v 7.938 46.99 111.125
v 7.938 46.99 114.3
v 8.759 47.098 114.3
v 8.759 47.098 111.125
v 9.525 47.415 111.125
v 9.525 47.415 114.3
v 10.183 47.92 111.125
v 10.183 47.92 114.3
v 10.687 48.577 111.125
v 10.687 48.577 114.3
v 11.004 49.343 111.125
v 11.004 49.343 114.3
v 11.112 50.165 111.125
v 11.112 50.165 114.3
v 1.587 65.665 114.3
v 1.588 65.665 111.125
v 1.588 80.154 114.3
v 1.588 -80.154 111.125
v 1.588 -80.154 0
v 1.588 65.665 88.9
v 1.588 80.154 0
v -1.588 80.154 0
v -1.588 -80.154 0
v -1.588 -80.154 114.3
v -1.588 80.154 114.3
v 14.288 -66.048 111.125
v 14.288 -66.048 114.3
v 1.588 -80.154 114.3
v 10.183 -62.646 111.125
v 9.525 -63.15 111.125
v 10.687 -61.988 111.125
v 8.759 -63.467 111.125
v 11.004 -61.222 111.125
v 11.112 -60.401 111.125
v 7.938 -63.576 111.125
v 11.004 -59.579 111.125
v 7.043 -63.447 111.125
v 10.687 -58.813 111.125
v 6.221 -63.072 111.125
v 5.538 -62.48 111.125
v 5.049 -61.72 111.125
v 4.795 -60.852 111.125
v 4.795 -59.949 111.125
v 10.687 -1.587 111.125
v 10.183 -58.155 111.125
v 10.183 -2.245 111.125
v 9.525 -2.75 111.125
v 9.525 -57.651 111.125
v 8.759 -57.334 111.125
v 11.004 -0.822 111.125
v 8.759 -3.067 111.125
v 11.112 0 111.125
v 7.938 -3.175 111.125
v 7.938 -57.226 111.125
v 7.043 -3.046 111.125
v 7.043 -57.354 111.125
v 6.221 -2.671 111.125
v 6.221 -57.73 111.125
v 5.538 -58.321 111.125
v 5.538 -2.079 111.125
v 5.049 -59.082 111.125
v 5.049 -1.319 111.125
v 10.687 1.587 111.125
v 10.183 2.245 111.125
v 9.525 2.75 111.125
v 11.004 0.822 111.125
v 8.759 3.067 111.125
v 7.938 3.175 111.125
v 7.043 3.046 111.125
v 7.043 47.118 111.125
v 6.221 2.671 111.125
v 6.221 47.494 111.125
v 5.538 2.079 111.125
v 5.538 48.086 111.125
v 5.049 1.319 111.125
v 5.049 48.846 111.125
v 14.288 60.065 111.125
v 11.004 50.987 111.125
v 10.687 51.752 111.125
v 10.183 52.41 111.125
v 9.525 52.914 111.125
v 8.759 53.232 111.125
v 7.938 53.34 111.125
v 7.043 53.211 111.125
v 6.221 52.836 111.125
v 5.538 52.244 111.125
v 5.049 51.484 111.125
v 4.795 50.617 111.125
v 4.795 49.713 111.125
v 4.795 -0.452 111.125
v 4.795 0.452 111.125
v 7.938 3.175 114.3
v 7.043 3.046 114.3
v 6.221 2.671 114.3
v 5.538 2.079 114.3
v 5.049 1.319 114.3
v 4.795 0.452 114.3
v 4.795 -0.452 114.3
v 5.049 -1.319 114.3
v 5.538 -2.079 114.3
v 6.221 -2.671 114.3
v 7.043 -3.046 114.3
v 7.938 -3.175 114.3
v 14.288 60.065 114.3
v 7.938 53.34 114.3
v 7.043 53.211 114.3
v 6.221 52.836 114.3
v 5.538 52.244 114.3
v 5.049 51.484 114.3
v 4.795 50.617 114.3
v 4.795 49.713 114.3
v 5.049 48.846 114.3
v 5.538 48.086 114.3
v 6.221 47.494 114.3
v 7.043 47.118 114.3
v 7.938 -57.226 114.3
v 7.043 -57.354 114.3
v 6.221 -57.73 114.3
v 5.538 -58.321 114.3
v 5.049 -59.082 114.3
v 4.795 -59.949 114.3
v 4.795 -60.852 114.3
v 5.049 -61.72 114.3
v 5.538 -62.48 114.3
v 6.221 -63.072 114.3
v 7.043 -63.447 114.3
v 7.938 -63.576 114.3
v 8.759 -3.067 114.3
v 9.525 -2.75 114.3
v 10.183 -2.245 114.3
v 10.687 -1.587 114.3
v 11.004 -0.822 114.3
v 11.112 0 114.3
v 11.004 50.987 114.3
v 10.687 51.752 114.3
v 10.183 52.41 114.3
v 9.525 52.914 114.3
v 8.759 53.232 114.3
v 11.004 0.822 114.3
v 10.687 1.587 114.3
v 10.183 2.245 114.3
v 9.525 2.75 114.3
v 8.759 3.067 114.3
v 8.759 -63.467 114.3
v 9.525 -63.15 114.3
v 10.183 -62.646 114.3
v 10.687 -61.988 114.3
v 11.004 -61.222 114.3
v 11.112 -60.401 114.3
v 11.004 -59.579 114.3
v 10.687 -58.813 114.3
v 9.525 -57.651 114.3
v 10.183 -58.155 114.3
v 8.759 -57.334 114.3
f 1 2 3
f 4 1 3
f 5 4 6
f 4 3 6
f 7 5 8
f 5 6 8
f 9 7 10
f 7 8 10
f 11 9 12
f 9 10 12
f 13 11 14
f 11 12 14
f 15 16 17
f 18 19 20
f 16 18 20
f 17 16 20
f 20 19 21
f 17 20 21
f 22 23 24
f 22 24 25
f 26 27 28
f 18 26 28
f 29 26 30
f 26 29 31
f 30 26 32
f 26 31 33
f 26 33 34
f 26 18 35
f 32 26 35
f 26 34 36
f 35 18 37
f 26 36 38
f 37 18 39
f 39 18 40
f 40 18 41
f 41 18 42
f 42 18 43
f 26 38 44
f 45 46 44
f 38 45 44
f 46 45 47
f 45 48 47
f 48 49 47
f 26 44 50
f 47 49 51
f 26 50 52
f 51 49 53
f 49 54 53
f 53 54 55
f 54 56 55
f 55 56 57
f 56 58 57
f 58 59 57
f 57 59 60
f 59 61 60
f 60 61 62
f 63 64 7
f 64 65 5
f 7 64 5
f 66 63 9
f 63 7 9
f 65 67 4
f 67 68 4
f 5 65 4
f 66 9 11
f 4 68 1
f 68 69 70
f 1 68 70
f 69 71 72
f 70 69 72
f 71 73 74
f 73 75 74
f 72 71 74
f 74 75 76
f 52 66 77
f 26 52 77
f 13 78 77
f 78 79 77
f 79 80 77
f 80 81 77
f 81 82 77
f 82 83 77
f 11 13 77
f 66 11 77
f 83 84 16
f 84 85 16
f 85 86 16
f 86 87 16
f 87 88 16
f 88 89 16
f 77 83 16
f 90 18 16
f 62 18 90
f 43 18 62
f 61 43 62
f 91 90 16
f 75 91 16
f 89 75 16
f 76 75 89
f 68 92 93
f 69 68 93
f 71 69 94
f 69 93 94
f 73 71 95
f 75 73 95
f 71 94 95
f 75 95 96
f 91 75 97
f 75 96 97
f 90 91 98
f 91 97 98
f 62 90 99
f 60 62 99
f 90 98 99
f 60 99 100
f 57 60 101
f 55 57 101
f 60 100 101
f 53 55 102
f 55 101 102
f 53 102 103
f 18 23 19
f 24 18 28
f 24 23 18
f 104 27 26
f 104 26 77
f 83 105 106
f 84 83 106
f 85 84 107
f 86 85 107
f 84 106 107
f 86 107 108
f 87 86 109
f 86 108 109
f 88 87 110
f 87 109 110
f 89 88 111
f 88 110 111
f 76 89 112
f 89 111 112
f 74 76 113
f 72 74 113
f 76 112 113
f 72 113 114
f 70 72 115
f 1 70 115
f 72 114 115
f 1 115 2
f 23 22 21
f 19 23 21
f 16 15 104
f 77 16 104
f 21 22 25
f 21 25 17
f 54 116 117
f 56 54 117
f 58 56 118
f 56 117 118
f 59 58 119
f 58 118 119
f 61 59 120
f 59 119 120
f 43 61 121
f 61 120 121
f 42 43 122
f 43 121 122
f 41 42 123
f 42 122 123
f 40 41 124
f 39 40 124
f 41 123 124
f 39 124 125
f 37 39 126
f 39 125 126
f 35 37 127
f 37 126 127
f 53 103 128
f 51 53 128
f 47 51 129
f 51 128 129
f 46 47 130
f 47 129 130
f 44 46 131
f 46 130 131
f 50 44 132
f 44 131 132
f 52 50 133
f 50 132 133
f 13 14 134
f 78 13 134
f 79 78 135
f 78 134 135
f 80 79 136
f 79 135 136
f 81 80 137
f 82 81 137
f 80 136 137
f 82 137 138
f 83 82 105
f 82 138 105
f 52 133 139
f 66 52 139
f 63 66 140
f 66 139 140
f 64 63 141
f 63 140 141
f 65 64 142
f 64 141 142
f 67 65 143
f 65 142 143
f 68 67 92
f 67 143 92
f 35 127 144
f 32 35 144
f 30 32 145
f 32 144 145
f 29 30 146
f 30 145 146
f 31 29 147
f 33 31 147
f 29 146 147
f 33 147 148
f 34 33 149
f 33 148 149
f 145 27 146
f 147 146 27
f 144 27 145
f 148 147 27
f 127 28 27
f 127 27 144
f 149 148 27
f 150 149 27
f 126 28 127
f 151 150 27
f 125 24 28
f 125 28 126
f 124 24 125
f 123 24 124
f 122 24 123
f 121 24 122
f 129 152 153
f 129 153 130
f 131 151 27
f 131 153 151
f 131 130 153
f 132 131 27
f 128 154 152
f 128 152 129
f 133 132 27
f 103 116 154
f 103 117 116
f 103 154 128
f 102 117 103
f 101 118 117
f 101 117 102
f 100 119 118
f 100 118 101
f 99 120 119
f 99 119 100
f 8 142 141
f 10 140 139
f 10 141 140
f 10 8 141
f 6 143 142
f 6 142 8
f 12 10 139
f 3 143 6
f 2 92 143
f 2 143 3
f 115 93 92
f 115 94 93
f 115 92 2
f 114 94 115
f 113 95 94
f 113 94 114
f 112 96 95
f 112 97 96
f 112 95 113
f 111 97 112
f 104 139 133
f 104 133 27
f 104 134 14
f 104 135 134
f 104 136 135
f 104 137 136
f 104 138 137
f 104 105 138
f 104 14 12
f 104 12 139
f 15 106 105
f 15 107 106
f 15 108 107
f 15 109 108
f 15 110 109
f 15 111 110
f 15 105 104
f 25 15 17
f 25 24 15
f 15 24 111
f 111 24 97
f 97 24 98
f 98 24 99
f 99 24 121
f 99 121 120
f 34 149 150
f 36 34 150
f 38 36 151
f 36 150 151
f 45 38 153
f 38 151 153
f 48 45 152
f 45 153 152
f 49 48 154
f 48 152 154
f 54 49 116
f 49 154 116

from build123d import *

# Parameters (mm, degrees)
F0_W     = 3.175
F0_H     = 160.30702
F1_DEPTH = 114.3
F2_W     = 145.818248
F2_H     = 3.175
F3_DEPTH = 12.7
F5_DEPTH = 25.4
F7_DEPTH = 25.4


with BuildPart() as f1:
    # F0 (on Top) → F1 (new body)
    with BuildSketch(Plane.XY):
        Rectangle(F0_W, F0_H)
    extrude(amount=F1_DEPTH)

    # F2 (on face) → F3 (join)
    with BuildSketch(Plane.YZ.offset(1.5875)):
        with Locations((-7.244386, 112.7125)):
            Rectangle(F2_W, F2_H)
    extrude(amount=F3_DEPTH)

    # F4 (on face) → F5 (cut)
    with BuildSketch(Plane.XY.offset(114.3)):
        Polygon((14.2875, 65.664738), (1.5875, 65.664738), (14.2875, 60.06493), align=None)
        Polygon((1.5875, -80.15351), (14.2875, -80.15351), (14.2875, -66.047616), align=None)
    extrude(amount=-F5_DEPTH, mode=Mode.SUBTRACT)

    # F6 (on face) → F7 (cut)
    with BuildSketch(Plane.XY.offset(114.3)):
        with BuildLine():
            ThreePointArc((11.1125, 50.164834), (10.182564, 52.409898), (7.9375, 53.339834))
            Line((7.9375, 53.339834), (7.9375, 46.989834))
            ThreePointArc((7.9375, 46.989834), (10.182564, 47.91977), (11.1125, 50.164834))
        make_face()
        with BuildLine():
            ThreePointArc((11.1125, -60.400563), (10.182564, -58.155499), (7.9375, -57.225563))
            Line((7.9375, -57.225563), (7.9375, -63.575563))
            ThreePointArc((7.9375, -63.575563), (10.182564, -62.645627), (11.1125, -60.400563))
        make_face()
        with BuildLine():
            Line((7.9375, -63.575563), (7.9375, -57.225563))
            ThreePointArc((7.9375, -57.225563), (4.7625, -60.400563), (7.9375, -63.575563))
        make_face()
        with BuildLine():
            ThreePointArc((11.1125, 0), (10.182564, 2.245064), (7.9375, 3.175))
            Line((7.9375, 3.175), (7.9375, -3.175))
            ThreePointArc((7.9375, -3.175), (10.182564, -2.245064), (11.1125, 0))
        make_face()
        with BuildLine():
            Line((7.9375, -3.175), (7.9375, 3.175))
            ThreePointArc((7.9375, 3.175), (4.7625, 0), (7.9375, -3.175))
        make_face()
        with BuildLine():
            Line((7.9375, 46.989834), (7.9375, 53.339834))
            ThreePointArc((7.9375, 53.339834), (4.7625, 50.164834), (7.9375, 46.989834))
        make_face()
    extrude(amount=-F7_DEPTH, mode=Mode.SUBTRACT)


solid = f1.part
